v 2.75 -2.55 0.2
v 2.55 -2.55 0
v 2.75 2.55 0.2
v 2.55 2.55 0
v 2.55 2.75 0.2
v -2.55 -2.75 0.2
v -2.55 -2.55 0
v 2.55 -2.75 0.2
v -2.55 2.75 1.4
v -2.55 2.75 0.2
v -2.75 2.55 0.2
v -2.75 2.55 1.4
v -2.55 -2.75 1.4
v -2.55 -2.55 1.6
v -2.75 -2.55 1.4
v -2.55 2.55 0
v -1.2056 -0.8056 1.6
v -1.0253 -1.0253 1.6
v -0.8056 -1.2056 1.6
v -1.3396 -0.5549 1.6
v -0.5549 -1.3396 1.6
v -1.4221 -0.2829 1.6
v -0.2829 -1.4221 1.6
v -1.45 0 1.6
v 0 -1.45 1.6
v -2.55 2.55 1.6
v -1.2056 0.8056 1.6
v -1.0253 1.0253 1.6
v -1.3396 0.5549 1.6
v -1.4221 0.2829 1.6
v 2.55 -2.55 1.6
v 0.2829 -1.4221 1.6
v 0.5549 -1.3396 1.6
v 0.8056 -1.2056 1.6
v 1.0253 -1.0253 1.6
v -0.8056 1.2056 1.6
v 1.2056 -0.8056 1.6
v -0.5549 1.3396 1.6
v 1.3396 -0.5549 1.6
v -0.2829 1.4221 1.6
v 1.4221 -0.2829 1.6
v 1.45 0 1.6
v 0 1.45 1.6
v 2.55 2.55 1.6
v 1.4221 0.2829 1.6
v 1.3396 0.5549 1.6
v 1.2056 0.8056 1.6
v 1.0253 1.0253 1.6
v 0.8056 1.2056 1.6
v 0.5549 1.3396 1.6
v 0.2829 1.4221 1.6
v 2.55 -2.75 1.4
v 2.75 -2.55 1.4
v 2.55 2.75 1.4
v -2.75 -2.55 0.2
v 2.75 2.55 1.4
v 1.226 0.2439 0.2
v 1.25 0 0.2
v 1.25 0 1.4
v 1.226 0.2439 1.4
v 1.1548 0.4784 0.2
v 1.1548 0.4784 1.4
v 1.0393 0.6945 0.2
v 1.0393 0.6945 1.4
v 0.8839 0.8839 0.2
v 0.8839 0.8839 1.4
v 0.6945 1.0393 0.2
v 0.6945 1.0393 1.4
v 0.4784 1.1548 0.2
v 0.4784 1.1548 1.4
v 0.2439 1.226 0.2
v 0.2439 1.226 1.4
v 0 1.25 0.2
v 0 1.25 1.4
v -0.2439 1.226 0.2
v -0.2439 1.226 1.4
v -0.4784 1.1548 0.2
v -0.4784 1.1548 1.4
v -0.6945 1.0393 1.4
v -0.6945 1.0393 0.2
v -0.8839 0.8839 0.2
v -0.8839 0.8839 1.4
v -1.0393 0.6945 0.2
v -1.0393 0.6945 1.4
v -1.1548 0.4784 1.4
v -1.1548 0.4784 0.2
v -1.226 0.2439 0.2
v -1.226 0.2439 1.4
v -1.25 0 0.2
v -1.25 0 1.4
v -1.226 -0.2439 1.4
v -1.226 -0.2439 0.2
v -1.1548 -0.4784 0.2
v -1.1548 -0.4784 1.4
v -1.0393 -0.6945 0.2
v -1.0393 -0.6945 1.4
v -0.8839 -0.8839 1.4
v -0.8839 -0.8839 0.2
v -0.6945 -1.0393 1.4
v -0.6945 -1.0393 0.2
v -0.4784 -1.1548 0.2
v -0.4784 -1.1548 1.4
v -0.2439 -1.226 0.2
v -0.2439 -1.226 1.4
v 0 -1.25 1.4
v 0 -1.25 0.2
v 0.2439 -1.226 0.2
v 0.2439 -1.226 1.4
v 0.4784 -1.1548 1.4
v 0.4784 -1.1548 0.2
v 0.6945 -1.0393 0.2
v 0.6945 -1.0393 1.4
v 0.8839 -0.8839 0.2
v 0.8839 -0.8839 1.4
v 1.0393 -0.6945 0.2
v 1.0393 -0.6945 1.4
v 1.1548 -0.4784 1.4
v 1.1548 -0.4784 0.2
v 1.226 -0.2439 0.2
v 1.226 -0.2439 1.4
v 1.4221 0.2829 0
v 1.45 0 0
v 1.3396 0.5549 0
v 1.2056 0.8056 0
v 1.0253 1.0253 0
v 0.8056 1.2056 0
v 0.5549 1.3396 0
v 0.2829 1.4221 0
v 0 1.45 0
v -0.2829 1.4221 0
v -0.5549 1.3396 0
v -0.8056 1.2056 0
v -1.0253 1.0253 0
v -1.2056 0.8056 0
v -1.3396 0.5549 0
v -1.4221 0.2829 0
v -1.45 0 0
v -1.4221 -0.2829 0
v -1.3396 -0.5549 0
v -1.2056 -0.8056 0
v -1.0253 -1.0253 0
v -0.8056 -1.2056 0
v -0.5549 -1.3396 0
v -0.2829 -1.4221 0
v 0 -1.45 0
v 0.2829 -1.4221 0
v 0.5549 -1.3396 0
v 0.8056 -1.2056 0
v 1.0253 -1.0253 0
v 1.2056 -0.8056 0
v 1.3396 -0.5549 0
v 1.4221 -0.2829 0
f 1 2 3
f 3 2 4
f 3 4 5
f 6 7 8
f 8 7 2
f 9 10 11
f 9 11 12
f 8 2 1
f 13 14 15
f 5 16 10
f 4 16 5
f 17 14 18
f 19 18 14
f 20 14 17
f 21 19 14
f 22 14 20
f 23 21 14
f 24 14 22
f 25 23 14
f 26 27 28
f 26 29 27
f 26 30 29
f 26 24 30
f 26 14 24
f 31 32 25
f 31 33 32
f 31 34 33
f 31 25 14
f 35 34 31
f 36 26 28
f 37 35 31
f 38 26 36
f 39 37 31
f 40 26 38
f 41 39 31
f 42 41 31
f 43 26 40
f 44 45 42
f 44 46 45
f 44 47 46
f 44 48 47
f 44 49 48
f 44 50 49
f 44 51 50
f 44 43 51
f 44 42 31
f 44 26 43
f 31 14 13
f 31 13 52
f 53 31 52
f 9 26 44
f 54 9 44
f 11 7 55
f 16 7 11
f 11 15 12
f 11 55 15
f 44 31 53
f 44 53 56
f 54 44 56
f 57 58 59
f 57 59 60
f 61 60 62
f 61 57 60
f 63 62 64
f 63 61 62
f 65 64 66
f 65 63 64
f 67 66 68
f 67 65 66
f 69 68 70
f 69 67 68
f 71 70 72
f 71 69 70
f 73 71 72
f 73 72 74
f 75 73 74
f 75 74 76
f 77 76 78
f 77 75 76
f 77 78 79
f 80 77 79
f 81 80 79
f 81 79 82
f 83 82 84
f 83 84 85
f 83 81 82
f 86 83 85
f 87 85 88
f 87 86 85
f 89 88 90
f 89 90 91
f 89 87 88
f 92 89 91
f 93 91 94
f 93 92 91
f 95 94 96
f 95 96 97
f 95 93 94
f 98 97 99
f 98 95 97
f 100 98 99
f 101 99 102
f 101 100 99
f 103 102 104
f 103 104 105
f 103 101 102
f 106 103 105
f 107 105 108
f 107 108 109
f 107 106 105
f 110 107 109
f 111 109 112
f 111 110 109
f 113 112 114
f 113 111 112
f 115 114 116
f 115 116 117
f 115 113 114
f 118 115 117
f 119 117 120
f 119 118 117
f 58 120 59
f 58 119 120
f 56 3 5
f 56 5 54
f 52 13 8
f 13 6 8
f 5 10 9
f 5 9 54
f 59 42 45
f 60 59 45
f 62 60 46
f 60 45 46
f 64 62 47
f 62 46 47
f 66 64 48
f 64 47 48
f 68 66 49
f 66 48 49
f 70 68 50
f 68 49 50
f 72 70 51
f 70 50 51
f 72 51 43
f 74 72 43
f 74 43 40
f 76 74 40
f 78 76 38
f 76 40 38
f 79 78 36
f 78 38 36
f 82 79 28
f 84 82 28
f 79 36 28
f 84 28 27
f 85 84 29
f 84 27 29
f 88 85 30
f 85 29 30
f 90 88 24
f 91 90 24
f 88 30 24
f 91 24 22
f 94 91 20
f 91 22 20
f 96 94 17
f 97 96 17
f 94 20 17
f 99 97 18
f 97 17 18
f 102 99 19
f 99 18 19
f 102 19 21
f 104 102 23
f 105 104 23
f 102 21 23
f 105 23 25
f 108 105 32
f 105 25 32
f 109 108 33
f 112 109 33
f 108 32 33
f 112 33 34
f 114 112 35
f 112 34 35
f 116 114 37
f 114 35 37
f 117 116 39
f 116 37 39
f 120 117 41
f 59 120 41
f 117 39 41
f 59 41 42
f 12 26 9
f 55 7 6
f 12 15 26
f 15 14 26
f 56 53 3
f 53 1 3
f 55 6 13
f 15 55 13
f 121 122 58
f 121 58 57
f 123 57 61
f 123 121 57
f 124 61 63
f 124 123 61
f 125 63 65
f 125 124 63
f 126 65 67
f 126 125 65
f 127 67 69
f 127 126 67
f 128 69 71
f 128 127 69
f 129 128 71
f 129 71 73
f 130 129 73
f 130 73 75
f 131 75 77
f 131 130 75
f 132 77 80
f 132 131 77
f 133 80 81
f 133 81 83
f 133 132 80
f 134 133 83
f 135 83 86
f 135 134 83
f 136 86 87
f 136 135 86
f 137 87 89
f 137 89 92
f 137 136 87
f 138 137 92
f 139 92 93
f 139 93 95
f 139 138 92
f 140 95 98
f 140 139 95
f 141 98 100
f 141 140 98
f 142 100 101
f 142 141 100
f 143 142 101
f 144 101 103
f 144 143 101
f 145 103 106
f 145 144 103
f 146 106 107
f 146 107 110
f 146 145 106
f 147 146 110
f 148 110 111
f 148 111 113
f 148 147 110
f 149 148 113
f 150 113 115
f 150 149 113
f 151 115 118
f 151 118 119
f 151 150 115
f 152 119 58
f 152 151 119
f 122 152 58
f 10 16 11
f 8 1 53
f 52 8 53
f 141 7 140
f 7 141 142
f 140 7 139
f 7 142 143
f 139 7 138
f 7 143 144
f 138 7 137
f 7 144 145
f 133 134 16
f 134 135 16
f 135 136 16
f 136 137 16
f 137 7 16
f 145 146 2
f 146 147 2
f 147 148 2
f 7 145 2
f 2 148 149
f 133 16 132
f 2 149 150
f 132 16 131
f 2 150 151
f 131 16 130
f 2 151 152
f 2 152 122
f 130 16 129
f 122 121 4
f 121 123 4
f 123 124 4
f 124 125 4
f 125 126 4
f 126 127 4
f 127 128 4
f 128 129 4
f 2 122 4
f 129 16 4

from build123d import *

# Parameters (mm, degrees)
SKETCH1_W           = 5.5
SKETCH1_H           = 5.5
SKETCH1_R           = 1.25
BOSS_EXTRUDE1_DEPTH = 1.6
CHAMFER1_SIZE       = 0.2


with BuildPart() as part:
    # Sketch1 → Boss-Extrude1 (new body)
    with BuildSketch(Plane.XY):
        Rectangle(SKETCH1_W, SKETCH1_H)
        Circle(SKETCH1_R, mode=Mode.SUBTRACT)
    extrude(amount=BOSS_EXTRUDE1_DEPTH)

    # Chamfer1
    chamfer1_edges = [part.edges().sort_by_distance(p)[0] for p in [
        (-2.75, 0, 1.6),
        (-1.25, 0, 0),
        (-1.25, 0, 1.6),
        (0, -2.75, 1.6),
        (2.75, 0, 1.6),
        (0, -2.75, 0),
        (-2.75, 0, 0),
        (0, 2.75, 0),
        (2.75, 0, 0),
        (0, 2.75, 1.6),
        (2.75, -2.75, 0.8),
        (-2.75, -2.75, 0.8),
        (-2.75, 2.75, 0.8),
        (2.75, 2.75, 0.8),
    ]]
    chamfer(chamfer1_edges, length=CHAMFER1_SIZE)


solid = part.part
